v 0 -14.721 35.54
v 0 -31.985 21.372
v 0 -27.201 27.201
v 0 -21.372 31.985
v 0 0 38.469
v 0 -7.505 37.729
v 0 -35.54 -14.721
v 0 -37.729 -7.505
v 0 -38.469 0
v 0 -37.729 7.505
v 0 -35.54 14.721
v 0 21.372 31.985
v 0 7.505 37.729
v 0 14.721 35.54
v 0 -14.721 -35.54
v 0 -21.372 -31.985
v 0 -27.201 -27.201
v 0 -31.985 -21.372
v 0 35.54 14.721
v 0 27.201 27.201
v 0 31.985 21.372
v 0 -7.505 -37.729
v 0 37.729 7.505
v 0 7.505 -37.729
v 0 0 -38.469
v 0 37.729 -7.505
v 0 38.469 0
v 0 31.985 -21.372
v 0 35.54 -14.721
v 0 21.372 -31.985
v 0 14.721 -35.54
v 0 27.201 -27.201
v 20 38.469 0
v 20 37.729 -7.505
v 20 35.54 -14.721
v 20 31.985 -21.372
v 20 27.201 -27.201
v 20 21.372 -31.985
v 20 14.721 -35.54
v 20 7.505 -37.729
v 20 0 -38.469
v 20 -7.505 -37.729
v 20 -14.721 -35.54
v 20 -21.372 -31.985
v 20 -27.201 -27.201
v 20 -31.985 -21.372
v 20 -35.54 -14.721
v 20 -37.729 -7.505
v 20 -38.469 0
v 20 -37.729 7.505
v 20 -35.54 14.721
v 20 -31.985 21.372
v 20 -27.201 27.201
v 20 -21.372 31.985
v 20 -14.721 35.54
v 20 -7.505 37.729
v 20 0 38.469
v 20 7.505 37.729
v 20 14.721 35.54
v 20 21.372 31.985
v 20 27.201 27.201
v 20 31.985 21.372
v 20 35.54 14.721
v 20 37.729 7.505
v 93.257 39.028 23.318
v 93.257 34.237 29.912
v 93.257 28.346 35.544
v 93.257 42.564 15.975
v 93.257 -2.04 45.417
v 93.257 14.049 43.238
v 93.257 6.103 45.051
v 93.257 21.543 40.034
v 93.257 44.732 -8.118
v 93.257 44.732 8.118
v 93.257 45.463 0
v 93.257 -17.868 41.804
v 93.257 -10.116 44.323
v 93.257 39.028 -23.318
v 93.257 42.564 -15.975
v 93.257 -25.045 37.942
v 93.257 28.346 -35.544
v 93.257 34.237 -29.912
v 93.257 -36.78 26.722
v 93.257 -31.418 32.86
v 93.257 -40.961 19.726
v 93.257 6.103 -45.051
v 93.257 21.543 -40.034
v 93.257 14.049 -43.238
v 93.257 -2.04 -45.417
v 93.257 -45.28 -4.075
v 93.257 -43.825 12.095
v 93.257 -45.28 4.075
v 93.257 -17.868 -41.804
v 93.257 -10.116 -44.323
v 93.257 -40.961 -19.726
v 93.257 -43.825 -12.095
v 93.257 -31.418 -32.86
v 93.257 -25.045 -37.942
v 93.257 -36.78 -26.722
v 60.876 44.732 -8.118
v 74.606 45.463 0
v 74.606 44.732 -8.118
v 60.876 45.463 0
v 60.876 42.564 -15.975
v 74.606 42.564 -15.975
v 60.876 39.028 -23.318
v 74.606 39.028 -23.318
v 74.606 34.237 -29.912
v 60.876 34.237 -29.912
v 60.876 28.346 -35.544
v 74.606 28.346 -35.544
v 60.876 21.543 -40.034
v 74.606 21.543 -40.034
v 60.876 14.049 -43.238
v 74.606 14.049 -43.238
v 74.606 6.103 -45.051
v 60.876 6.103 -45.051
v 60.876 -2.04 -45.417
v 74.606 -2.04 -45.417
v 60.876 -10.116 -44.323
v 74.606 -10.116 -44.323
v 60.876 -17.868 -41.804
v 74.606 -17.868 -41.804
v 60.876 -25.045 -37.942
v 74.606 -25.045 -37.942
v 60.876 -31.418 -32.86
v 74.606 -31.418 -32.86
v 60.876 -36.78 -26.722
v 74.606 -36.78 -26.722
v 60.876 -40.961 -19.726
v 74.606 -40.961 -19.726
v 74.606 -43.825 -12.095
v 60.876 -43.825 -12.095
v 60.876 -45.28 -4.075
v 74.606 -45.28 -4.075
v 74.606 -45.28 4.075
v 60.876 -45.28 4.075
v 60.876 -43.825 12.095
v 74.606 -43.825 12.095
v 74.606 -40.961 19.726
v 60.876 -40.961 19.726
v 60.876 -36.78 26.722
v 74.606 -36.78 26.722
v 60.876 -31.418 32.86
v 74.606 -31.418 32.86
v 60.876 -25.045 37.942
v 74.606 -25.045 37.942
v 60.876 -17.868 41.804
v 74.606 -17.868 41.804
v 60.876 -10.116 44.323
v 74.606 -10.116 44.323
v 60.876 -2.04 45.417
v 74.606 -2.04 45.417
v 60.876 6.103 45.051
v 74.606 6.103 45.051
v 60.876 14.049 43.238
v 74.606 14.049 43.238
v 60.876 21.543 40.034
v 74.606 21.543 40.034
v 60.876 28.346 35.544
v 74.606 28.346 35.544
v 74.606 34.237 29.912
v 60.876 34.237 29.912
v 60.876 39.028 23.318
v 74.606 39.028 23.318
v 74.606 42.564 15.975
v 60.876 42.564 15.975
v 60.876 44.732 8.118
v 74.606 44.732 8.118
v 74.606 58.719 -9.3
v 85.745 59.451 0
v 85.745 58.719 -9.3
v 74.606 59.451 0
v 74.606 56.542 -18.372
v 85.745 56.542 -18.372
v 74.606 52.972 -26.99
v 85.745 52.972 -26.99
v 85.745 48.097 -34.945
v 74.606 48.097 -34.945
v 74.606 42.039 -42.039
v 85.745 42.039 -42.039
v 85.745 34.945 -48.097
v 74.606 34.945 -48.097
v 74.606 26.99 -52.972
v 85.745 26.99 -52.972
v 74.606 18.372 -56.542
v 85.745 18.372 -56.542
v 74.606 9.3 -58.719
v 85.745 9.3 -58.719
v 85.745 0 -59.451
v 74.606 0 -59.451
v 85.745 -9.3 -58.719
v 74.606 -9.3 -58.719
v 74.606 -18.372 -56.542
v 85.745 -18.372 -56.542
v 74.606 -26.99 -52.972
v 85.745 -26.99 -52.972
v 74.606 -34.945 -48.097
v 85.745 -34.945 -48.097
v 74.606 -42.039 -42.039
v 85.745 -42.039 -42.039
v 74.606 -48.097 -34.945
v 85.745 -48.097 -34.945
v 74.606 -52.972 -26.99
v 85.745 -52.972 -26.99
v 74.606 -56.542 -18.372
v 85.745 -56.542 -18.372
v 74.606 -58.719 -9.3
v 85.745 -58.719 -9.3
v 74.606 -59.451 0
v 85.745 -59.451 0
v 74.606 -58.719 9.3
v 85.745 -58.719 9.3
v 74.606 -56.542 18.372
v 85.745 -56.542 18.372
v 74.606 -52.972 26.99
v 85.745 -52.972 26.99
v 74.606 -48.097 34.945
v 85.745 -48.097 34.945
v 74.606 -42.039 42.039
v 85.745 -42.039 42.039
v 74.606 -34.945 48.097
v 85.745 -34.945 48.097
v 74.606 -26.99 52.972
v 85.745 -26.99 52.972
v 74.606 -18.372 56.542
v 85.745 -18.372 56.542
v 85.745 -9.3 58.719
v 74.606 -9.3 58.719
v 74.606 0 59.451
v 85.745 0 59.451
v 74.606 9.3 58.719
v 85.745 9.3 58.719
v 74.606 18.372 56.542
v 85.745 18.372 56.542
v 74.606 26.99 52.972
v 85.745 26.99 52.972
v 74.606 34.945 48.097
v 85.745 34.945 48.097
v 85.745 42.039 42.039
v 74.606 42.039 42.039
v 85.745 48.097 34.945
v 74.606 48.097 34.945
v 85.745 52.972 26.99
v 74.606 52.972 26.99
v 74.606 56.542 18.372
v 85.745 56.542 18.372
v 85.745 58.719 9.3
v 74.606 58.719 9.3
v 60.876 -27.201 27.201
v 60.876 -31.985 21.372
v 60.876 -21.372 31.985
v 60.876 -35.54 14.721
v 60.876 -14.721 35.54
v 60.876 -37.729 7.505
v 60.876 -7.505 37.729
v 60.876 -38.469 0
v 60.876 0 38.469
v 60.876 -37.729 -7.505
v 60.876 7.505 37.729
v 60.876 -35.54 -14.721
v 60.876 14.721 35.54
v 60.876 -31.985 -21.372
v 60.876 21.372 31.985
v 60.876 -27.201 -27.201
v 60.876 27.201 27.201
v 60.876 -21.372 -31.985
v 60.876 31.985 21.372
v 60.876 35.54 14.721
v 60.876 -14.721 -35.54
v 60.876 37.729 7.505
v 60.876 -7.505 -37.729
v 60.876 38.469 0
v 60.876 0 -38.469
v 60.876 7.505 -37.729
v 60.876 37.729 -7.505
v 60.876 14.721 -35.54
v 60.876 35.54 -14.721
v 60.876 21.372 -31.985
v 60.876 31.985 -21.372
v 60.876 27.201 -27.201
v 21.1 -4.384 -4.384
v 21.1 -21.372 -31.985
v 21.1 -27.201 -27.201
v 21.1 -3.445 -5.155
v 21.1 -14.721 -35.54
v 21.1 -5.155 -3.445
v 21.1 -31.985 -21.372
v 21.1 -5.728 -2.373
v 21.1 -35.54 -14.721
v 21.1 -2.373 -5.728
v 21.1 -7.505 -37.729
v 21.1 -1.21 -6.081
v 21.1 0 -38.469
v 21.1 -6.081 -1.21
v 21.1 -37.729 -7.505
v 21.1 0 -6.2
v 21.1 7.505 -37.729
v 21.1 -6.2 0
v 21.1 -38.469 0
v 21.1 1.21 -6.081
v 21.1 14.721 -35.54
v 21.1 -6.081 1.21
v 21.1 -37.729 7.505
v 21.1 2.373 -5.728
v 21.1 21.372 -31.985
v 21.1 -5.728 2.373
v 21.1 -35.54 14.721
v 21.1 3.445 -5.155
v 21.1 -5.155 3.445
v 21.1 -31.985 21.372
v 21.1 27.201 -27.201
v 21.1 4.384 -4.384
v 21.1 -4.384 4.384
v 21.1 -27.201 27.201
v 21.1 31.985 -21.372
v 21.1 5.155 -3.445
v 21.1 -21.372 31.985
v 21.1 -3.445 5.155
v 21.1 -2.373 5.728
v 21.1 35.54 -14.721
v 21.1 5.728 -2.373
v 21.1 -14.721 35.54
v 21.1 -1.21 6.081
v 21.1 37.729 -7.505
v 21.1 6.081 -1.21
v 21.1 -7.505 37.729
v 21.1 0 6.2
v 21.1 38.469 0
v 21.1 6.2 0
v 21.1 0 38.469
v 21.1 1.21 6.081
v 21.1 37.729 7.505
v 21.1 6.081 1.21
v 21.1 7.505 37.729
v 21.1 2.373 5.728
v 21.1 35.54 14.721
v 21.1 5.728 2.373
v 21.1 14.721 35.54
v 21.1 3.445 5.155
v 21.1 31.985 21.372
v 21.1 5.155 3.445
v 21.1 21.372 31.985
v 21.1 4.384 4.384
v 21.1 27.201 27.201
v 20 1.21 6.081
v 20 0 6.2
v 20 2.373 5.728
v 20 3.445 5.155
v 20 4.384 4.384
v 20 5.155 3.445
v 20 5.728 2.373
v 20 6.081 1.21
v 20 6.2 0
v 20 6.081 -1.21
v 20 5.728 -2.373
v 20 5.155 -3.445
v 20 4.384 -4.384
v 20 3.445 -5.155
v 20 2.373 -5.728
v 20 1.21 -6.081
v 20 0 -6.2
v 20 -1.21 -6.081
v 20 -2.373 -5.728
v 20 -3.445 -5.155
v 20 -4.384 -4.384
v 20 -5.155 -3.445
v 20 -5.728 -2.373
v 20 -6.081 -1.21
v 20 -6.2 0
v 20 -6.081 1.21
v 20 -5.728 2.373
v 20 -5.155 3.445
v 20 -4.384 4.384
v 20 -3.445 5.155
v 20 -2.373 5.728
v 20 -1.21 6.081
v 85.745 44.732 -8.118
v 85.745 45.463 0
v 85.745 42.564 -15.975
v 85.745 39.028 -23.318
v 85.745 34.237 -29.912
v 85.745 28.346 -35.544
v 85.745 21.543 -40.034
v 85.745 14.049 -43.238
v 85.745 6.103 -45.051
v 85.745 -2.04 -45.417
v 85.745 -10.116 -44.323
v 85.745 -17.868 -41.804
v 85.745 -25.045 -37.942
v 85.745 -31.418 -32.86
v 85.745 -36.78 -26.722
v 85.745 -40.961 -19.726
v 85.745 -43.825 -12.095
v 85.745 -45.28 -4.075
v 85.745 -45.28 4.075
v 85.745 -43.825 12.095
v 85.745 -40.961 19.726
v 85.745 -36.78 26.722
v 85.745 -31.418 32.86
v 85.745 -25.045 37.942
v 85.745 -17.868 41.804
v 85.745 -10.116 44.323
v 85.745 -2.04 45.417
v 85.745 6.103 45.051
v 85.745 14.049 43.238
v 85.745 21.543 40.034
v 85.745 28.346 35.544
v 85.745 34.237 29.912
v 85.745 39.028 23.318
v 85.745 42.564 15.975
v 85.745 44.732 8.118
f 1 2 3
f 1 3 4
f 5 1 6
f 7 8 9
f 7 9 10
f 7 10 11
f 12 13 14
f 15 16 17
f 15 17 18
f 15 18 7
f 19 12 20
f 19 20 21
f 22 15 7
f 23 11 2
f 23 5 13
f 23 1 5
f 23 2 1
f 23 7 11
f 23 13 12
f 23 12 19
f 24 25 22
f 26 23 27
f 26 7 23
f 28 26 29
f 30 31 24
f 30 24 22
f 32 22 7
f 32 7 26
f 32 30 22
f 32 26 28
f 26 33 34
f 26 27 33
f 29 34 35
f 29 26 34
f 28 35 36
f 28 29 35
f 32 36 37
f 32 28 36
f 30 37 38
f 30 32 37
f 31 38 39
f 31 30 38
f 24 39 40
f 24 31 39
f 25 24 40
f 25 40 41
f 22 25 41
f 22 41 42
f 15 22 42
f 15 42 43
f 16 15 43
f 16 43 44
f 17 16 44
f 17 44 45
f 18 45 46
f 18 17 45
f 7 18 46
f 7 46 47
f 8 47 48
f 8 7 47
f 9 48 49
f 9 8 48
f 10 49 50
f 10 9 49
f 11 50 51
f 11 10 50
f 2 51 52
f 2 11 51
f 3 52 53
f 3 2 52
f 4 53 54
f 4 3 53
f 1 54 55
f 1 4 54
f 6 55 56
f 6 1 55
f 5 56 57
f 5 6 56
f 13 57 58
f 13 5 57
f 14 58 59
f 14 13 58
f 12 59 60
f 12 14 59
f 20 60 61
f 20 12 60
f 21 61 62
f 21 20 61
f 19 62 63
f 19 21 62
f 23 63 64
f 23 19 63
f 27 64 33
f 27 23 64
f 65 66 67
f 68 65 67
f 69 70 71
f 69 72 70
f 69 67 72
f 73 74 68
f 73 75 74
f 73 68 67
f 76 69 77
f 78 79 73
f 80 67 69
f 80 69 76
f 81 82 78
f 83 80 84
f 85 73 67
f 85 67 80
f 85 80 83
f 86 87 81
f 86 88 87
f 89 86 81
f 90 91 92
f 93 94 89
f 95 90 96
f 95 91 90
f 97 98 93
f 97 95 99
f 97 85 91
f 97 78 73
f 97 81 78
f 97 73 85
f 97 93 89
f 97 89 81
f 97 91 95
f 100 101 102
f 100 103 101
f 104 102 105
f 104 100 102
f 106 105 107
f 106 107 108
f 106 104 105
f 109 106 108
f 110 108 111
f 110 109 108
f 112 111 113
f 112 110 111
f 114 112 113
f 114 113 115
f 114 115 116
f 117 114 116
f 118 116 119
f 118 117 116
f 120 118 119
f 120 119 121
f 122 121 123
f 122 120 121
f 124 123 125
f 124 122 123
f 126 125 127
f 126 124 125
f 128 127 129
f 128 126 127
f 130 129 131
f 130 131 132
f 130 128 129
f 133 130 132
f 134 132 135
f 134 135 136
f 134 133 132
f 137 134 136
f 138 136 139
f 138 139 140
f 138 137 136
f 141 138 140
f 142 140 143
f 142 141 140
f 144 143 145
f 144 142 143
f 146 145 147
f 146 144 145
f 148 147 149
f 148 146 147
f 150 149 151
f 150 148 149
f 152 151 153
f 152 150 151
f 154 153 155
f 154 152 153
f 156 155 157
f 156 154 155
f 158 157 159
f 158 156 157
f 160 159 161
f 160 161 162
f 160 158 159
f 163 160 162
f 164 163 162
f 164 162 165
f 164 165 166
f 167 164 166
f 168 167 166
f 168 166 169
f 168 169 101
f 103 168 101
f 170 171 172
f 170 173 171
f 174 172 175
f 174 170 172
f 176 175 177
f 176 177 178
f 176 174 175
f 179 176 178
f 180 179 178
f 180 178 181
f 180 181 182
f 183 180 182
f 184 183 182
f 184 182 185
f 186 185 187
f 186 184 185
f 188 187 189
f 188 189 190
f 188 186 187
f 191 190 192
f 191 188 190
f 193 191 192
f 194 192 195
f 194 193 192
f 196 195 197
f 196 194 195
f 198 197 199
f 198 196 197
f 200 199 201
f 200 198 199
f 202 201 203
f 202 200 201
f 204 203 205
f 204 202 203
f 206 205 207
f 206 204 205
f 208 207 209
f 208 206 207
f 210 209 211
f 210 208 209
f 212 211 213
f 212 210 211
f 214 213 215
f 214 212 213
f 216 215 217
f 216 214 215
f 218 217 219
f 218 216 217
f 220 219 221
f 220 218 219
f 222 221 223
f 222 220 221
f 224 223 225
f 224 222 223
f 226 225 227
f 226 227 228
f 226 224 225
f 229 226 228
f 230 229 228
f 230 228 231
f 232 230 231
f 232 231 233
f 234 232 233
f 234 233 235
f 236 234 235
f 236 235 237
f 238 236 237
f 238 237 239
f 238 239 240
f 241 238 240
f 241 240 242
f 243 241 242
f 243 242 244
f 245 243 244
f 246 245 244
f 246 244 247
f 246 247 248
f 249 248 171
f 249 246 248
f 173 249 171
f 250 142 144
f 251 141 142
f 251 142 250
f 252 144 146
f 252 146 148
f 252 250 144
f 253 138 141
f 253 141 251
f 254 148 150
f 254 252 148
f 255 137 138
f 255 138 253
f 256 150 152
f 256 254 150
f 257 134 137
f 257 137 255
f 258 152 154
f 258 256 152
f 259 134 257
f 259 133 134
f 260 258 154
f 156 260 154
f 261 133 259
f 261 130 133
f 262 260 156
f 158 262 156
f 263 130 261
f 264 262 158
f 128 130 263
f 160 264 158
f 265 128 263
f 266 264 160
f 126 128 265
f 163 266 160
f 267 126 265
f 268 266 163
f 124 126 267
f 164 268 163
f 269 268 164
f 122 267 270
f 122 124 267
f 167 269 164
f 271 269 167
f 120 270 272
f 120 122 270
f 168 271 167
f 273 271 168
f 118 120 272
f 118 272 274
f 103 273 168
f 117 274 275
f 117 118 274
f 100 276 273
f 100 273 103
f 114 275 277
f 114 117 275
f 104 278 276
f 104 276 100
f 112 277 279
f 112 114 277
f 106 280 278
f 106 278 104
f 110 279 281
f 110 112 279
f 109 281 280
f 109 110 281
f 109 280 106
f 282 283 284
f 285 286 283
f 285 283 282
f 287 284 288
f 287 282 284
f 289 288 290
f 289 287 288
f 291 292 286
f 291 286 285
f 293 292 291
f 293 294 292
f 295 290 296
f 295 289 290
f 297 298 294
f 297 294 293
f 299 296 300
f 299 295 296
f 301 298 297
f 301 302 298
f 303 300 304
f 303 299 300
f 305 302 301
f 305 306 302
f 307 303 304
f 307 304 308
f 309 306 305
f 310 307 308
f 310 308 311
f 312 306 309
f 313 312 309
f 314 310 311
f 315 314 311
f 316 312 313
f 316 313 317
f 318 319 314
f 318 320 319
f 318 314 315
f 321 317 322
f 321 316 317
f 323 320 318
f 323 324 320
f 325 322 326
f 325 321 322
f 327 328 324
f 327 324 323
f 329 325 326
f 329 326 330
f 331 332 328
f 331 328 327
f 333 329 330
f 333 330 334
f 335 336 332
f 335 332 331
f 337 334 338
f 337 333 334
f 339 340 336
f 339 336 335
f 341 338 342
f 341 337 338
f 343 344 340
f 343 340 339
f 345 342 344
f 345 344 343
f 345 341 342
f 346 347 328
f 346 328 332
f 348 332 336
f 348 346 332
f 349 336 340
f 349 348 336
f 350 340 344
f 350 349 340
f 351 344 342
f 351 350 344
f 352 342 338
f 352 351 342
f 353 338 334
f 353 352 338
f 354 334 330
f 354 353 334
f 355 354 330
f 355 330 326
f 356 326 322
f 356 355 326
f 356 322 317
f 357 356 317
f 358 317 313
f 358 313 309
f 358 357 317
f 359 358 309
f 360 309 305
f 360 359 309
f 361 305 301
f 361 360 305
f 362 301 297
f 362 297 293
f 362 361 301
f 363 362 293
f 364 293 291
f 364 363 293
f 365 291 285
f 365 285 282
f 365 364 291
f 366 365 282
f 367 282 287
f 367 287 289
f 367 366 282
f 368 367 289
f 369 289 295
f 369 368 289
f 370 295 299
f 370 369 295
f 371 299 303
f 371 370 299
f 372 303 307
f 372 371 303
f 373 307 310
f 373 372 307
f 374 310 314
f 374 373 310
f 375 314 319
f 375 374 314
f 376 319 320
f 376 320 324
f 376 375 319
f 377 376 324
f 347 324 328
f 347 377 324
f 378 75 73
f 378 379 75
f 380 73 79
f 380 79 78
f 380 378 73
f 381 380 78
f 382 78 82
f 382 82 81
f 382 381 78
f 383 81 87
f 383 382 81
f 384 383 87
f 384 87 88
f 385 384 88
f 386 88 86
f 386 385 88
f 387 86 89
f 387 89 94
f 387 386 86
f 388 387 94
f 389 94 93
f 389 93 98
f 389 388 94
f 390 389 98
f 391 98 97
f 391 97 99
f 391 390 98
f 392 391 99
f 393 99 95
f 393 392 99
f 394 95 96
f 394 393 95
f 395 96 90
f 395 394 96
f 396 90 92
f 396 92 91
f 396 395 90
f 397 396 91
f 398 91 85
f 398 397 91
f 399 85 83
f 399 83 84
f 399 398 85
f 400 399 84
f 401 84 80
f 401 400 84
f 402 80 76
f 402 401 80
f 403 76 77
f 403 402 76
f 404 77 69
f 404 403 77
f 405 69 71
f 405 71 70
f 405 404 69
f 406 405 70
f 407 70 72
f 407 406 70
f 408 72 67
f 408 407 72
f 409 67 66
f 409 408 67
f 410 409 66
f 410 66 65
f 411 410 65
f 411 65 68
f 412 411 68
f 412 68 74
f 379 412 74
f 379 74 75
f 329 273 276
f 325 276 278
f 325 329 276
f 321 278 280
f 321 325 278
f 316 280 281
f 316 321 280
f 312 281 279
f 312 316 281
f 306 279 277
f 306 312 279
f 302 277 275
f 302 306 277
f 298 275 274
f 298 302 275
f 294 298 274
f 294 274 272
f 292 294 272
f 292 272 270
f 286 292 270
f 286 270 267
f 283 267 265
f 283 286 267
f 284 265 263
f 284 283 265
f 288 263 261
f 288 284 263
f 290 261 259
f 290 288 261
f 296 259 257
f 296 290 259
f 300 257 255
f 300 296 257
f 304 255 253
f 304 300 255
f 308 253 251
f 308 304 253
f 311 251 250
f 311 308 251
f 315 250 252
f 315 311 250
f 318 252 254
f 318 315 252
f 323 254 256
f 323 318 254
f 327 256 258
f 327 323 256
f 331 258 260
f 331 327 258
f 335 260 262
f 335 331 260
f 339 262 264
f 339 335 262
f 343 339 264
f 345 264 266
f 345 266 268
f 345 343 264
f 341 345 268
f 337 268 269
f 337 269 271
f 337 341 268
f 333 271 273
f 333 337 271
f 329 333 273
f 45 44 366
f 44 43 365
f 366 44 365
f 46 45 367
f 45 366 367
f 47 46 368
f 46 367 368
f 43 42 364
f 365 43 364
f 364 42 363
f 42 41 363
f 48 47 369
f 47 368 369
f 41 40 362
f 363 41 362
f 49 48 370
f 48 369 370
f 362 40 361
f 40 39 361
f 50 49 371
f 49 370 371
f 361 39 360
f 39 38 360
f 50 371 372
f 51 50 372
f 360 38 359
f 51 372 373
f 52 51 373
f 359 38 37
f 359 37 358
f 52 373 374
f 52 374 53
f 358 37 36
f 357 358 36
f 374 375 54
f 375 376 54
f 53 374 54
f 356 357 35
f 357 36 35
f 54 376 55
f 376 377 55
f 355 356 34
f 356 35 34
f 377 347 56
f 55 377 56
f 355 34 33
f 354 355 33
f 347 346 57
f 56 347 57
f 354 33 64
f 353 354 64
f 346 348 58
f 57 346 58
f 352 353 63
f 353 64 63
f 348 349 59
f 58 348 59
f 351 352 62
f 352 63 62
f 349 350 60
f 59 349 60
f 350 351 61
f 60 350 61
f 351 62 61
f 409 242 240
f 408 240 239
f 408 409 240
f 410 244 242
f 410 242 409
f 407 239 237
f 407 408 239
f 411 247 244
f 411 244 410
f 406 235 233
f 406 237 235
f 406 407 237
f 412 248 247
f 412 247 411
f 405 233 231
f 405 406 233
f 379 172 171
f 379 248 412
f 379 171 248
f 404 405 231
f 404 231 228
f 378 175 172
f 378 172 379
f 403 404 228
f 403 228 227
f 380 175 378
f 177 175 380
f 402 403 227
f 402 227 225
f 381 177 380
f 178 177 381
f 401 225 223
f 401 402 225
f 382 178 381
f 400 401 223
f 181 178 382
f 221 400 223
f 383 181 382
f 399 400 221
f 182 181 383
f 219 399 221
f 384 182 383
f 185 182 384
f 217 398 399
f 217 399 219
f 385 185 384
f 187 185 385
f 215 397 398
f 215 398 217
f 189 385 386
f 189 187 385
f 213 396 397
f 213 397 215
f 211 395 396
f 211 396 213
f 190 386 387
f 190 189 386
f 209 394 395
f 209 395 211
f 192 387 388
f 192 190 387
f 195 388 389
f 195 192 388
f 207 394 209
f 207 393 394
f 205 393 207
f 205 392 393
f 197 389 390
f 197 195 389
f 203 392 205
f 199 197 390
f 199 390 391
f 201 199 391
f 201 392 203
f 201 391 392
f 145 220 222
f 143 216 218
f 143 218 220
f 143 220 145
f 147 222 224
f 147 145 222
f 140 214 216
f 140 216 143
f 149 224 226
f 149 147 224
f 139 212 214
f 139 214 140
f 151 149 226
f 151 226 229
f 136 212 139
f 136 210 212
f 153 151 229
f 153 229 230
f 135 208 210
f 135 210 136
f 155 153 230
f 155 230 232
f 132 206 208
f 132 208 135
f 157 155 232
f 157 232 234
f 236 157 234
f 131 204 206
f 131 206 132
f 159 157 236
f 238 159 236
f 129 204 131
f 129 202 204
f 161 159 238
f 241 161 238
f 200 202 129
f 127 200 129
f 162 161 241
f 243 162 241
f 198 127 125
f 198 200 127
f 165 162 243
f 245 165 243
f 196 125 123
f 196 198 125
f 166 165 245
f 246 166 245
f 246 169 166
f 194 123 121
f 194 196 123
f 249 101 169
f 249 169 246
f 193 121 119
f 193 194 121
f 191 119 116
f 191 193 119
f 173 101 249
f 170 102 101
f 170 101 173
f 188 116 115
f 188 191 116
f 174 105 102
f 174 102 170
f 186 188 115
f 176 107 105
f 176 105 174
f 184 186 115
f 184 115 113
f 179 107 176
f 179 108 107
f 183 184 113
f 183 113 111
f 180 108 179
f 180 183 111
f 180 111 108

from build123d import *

# Parameters (mm, degrees)
SKICA3_R                 = 38.468571429
SKICA3_R_2               = 6.2
ODEBRAT_VYSUNUT_M1_DEPTH = 1.1


with BuildPart() as part:
    # Skica1 → Rotovat1 (revolve)
    with BuildSketch(Plane.XY):
        Polygon((0, 0), (93.257142857, 0), (93.257142857, 45.462857143), (85.744761905, 45.462857143), (85.744761905, 59.451428571), (74.605714286, 59.451428571), (74.605714286, 45.462857143), (60.876190476, 45.462857143), (60.876190476, 38.468571429), (0, 38.468571429), align=None)
    revolve(axis=Axis((0, 0, 0), (-1, 0, 0)))

    # Skica3 → Odebrat vysunutím1 (cut)
    with BuildSketch(Plane.ZY.offset(-20)):
        Circle(SKICA3_R)
        Circle(SKICA3_R_2, mode=Mode.SUBTRACT)
    extrude(amount=-ODEBRAT_VYSUNUT_M1_DEPTH, mode=Mode.SUBTRACT)


solid = part.part
